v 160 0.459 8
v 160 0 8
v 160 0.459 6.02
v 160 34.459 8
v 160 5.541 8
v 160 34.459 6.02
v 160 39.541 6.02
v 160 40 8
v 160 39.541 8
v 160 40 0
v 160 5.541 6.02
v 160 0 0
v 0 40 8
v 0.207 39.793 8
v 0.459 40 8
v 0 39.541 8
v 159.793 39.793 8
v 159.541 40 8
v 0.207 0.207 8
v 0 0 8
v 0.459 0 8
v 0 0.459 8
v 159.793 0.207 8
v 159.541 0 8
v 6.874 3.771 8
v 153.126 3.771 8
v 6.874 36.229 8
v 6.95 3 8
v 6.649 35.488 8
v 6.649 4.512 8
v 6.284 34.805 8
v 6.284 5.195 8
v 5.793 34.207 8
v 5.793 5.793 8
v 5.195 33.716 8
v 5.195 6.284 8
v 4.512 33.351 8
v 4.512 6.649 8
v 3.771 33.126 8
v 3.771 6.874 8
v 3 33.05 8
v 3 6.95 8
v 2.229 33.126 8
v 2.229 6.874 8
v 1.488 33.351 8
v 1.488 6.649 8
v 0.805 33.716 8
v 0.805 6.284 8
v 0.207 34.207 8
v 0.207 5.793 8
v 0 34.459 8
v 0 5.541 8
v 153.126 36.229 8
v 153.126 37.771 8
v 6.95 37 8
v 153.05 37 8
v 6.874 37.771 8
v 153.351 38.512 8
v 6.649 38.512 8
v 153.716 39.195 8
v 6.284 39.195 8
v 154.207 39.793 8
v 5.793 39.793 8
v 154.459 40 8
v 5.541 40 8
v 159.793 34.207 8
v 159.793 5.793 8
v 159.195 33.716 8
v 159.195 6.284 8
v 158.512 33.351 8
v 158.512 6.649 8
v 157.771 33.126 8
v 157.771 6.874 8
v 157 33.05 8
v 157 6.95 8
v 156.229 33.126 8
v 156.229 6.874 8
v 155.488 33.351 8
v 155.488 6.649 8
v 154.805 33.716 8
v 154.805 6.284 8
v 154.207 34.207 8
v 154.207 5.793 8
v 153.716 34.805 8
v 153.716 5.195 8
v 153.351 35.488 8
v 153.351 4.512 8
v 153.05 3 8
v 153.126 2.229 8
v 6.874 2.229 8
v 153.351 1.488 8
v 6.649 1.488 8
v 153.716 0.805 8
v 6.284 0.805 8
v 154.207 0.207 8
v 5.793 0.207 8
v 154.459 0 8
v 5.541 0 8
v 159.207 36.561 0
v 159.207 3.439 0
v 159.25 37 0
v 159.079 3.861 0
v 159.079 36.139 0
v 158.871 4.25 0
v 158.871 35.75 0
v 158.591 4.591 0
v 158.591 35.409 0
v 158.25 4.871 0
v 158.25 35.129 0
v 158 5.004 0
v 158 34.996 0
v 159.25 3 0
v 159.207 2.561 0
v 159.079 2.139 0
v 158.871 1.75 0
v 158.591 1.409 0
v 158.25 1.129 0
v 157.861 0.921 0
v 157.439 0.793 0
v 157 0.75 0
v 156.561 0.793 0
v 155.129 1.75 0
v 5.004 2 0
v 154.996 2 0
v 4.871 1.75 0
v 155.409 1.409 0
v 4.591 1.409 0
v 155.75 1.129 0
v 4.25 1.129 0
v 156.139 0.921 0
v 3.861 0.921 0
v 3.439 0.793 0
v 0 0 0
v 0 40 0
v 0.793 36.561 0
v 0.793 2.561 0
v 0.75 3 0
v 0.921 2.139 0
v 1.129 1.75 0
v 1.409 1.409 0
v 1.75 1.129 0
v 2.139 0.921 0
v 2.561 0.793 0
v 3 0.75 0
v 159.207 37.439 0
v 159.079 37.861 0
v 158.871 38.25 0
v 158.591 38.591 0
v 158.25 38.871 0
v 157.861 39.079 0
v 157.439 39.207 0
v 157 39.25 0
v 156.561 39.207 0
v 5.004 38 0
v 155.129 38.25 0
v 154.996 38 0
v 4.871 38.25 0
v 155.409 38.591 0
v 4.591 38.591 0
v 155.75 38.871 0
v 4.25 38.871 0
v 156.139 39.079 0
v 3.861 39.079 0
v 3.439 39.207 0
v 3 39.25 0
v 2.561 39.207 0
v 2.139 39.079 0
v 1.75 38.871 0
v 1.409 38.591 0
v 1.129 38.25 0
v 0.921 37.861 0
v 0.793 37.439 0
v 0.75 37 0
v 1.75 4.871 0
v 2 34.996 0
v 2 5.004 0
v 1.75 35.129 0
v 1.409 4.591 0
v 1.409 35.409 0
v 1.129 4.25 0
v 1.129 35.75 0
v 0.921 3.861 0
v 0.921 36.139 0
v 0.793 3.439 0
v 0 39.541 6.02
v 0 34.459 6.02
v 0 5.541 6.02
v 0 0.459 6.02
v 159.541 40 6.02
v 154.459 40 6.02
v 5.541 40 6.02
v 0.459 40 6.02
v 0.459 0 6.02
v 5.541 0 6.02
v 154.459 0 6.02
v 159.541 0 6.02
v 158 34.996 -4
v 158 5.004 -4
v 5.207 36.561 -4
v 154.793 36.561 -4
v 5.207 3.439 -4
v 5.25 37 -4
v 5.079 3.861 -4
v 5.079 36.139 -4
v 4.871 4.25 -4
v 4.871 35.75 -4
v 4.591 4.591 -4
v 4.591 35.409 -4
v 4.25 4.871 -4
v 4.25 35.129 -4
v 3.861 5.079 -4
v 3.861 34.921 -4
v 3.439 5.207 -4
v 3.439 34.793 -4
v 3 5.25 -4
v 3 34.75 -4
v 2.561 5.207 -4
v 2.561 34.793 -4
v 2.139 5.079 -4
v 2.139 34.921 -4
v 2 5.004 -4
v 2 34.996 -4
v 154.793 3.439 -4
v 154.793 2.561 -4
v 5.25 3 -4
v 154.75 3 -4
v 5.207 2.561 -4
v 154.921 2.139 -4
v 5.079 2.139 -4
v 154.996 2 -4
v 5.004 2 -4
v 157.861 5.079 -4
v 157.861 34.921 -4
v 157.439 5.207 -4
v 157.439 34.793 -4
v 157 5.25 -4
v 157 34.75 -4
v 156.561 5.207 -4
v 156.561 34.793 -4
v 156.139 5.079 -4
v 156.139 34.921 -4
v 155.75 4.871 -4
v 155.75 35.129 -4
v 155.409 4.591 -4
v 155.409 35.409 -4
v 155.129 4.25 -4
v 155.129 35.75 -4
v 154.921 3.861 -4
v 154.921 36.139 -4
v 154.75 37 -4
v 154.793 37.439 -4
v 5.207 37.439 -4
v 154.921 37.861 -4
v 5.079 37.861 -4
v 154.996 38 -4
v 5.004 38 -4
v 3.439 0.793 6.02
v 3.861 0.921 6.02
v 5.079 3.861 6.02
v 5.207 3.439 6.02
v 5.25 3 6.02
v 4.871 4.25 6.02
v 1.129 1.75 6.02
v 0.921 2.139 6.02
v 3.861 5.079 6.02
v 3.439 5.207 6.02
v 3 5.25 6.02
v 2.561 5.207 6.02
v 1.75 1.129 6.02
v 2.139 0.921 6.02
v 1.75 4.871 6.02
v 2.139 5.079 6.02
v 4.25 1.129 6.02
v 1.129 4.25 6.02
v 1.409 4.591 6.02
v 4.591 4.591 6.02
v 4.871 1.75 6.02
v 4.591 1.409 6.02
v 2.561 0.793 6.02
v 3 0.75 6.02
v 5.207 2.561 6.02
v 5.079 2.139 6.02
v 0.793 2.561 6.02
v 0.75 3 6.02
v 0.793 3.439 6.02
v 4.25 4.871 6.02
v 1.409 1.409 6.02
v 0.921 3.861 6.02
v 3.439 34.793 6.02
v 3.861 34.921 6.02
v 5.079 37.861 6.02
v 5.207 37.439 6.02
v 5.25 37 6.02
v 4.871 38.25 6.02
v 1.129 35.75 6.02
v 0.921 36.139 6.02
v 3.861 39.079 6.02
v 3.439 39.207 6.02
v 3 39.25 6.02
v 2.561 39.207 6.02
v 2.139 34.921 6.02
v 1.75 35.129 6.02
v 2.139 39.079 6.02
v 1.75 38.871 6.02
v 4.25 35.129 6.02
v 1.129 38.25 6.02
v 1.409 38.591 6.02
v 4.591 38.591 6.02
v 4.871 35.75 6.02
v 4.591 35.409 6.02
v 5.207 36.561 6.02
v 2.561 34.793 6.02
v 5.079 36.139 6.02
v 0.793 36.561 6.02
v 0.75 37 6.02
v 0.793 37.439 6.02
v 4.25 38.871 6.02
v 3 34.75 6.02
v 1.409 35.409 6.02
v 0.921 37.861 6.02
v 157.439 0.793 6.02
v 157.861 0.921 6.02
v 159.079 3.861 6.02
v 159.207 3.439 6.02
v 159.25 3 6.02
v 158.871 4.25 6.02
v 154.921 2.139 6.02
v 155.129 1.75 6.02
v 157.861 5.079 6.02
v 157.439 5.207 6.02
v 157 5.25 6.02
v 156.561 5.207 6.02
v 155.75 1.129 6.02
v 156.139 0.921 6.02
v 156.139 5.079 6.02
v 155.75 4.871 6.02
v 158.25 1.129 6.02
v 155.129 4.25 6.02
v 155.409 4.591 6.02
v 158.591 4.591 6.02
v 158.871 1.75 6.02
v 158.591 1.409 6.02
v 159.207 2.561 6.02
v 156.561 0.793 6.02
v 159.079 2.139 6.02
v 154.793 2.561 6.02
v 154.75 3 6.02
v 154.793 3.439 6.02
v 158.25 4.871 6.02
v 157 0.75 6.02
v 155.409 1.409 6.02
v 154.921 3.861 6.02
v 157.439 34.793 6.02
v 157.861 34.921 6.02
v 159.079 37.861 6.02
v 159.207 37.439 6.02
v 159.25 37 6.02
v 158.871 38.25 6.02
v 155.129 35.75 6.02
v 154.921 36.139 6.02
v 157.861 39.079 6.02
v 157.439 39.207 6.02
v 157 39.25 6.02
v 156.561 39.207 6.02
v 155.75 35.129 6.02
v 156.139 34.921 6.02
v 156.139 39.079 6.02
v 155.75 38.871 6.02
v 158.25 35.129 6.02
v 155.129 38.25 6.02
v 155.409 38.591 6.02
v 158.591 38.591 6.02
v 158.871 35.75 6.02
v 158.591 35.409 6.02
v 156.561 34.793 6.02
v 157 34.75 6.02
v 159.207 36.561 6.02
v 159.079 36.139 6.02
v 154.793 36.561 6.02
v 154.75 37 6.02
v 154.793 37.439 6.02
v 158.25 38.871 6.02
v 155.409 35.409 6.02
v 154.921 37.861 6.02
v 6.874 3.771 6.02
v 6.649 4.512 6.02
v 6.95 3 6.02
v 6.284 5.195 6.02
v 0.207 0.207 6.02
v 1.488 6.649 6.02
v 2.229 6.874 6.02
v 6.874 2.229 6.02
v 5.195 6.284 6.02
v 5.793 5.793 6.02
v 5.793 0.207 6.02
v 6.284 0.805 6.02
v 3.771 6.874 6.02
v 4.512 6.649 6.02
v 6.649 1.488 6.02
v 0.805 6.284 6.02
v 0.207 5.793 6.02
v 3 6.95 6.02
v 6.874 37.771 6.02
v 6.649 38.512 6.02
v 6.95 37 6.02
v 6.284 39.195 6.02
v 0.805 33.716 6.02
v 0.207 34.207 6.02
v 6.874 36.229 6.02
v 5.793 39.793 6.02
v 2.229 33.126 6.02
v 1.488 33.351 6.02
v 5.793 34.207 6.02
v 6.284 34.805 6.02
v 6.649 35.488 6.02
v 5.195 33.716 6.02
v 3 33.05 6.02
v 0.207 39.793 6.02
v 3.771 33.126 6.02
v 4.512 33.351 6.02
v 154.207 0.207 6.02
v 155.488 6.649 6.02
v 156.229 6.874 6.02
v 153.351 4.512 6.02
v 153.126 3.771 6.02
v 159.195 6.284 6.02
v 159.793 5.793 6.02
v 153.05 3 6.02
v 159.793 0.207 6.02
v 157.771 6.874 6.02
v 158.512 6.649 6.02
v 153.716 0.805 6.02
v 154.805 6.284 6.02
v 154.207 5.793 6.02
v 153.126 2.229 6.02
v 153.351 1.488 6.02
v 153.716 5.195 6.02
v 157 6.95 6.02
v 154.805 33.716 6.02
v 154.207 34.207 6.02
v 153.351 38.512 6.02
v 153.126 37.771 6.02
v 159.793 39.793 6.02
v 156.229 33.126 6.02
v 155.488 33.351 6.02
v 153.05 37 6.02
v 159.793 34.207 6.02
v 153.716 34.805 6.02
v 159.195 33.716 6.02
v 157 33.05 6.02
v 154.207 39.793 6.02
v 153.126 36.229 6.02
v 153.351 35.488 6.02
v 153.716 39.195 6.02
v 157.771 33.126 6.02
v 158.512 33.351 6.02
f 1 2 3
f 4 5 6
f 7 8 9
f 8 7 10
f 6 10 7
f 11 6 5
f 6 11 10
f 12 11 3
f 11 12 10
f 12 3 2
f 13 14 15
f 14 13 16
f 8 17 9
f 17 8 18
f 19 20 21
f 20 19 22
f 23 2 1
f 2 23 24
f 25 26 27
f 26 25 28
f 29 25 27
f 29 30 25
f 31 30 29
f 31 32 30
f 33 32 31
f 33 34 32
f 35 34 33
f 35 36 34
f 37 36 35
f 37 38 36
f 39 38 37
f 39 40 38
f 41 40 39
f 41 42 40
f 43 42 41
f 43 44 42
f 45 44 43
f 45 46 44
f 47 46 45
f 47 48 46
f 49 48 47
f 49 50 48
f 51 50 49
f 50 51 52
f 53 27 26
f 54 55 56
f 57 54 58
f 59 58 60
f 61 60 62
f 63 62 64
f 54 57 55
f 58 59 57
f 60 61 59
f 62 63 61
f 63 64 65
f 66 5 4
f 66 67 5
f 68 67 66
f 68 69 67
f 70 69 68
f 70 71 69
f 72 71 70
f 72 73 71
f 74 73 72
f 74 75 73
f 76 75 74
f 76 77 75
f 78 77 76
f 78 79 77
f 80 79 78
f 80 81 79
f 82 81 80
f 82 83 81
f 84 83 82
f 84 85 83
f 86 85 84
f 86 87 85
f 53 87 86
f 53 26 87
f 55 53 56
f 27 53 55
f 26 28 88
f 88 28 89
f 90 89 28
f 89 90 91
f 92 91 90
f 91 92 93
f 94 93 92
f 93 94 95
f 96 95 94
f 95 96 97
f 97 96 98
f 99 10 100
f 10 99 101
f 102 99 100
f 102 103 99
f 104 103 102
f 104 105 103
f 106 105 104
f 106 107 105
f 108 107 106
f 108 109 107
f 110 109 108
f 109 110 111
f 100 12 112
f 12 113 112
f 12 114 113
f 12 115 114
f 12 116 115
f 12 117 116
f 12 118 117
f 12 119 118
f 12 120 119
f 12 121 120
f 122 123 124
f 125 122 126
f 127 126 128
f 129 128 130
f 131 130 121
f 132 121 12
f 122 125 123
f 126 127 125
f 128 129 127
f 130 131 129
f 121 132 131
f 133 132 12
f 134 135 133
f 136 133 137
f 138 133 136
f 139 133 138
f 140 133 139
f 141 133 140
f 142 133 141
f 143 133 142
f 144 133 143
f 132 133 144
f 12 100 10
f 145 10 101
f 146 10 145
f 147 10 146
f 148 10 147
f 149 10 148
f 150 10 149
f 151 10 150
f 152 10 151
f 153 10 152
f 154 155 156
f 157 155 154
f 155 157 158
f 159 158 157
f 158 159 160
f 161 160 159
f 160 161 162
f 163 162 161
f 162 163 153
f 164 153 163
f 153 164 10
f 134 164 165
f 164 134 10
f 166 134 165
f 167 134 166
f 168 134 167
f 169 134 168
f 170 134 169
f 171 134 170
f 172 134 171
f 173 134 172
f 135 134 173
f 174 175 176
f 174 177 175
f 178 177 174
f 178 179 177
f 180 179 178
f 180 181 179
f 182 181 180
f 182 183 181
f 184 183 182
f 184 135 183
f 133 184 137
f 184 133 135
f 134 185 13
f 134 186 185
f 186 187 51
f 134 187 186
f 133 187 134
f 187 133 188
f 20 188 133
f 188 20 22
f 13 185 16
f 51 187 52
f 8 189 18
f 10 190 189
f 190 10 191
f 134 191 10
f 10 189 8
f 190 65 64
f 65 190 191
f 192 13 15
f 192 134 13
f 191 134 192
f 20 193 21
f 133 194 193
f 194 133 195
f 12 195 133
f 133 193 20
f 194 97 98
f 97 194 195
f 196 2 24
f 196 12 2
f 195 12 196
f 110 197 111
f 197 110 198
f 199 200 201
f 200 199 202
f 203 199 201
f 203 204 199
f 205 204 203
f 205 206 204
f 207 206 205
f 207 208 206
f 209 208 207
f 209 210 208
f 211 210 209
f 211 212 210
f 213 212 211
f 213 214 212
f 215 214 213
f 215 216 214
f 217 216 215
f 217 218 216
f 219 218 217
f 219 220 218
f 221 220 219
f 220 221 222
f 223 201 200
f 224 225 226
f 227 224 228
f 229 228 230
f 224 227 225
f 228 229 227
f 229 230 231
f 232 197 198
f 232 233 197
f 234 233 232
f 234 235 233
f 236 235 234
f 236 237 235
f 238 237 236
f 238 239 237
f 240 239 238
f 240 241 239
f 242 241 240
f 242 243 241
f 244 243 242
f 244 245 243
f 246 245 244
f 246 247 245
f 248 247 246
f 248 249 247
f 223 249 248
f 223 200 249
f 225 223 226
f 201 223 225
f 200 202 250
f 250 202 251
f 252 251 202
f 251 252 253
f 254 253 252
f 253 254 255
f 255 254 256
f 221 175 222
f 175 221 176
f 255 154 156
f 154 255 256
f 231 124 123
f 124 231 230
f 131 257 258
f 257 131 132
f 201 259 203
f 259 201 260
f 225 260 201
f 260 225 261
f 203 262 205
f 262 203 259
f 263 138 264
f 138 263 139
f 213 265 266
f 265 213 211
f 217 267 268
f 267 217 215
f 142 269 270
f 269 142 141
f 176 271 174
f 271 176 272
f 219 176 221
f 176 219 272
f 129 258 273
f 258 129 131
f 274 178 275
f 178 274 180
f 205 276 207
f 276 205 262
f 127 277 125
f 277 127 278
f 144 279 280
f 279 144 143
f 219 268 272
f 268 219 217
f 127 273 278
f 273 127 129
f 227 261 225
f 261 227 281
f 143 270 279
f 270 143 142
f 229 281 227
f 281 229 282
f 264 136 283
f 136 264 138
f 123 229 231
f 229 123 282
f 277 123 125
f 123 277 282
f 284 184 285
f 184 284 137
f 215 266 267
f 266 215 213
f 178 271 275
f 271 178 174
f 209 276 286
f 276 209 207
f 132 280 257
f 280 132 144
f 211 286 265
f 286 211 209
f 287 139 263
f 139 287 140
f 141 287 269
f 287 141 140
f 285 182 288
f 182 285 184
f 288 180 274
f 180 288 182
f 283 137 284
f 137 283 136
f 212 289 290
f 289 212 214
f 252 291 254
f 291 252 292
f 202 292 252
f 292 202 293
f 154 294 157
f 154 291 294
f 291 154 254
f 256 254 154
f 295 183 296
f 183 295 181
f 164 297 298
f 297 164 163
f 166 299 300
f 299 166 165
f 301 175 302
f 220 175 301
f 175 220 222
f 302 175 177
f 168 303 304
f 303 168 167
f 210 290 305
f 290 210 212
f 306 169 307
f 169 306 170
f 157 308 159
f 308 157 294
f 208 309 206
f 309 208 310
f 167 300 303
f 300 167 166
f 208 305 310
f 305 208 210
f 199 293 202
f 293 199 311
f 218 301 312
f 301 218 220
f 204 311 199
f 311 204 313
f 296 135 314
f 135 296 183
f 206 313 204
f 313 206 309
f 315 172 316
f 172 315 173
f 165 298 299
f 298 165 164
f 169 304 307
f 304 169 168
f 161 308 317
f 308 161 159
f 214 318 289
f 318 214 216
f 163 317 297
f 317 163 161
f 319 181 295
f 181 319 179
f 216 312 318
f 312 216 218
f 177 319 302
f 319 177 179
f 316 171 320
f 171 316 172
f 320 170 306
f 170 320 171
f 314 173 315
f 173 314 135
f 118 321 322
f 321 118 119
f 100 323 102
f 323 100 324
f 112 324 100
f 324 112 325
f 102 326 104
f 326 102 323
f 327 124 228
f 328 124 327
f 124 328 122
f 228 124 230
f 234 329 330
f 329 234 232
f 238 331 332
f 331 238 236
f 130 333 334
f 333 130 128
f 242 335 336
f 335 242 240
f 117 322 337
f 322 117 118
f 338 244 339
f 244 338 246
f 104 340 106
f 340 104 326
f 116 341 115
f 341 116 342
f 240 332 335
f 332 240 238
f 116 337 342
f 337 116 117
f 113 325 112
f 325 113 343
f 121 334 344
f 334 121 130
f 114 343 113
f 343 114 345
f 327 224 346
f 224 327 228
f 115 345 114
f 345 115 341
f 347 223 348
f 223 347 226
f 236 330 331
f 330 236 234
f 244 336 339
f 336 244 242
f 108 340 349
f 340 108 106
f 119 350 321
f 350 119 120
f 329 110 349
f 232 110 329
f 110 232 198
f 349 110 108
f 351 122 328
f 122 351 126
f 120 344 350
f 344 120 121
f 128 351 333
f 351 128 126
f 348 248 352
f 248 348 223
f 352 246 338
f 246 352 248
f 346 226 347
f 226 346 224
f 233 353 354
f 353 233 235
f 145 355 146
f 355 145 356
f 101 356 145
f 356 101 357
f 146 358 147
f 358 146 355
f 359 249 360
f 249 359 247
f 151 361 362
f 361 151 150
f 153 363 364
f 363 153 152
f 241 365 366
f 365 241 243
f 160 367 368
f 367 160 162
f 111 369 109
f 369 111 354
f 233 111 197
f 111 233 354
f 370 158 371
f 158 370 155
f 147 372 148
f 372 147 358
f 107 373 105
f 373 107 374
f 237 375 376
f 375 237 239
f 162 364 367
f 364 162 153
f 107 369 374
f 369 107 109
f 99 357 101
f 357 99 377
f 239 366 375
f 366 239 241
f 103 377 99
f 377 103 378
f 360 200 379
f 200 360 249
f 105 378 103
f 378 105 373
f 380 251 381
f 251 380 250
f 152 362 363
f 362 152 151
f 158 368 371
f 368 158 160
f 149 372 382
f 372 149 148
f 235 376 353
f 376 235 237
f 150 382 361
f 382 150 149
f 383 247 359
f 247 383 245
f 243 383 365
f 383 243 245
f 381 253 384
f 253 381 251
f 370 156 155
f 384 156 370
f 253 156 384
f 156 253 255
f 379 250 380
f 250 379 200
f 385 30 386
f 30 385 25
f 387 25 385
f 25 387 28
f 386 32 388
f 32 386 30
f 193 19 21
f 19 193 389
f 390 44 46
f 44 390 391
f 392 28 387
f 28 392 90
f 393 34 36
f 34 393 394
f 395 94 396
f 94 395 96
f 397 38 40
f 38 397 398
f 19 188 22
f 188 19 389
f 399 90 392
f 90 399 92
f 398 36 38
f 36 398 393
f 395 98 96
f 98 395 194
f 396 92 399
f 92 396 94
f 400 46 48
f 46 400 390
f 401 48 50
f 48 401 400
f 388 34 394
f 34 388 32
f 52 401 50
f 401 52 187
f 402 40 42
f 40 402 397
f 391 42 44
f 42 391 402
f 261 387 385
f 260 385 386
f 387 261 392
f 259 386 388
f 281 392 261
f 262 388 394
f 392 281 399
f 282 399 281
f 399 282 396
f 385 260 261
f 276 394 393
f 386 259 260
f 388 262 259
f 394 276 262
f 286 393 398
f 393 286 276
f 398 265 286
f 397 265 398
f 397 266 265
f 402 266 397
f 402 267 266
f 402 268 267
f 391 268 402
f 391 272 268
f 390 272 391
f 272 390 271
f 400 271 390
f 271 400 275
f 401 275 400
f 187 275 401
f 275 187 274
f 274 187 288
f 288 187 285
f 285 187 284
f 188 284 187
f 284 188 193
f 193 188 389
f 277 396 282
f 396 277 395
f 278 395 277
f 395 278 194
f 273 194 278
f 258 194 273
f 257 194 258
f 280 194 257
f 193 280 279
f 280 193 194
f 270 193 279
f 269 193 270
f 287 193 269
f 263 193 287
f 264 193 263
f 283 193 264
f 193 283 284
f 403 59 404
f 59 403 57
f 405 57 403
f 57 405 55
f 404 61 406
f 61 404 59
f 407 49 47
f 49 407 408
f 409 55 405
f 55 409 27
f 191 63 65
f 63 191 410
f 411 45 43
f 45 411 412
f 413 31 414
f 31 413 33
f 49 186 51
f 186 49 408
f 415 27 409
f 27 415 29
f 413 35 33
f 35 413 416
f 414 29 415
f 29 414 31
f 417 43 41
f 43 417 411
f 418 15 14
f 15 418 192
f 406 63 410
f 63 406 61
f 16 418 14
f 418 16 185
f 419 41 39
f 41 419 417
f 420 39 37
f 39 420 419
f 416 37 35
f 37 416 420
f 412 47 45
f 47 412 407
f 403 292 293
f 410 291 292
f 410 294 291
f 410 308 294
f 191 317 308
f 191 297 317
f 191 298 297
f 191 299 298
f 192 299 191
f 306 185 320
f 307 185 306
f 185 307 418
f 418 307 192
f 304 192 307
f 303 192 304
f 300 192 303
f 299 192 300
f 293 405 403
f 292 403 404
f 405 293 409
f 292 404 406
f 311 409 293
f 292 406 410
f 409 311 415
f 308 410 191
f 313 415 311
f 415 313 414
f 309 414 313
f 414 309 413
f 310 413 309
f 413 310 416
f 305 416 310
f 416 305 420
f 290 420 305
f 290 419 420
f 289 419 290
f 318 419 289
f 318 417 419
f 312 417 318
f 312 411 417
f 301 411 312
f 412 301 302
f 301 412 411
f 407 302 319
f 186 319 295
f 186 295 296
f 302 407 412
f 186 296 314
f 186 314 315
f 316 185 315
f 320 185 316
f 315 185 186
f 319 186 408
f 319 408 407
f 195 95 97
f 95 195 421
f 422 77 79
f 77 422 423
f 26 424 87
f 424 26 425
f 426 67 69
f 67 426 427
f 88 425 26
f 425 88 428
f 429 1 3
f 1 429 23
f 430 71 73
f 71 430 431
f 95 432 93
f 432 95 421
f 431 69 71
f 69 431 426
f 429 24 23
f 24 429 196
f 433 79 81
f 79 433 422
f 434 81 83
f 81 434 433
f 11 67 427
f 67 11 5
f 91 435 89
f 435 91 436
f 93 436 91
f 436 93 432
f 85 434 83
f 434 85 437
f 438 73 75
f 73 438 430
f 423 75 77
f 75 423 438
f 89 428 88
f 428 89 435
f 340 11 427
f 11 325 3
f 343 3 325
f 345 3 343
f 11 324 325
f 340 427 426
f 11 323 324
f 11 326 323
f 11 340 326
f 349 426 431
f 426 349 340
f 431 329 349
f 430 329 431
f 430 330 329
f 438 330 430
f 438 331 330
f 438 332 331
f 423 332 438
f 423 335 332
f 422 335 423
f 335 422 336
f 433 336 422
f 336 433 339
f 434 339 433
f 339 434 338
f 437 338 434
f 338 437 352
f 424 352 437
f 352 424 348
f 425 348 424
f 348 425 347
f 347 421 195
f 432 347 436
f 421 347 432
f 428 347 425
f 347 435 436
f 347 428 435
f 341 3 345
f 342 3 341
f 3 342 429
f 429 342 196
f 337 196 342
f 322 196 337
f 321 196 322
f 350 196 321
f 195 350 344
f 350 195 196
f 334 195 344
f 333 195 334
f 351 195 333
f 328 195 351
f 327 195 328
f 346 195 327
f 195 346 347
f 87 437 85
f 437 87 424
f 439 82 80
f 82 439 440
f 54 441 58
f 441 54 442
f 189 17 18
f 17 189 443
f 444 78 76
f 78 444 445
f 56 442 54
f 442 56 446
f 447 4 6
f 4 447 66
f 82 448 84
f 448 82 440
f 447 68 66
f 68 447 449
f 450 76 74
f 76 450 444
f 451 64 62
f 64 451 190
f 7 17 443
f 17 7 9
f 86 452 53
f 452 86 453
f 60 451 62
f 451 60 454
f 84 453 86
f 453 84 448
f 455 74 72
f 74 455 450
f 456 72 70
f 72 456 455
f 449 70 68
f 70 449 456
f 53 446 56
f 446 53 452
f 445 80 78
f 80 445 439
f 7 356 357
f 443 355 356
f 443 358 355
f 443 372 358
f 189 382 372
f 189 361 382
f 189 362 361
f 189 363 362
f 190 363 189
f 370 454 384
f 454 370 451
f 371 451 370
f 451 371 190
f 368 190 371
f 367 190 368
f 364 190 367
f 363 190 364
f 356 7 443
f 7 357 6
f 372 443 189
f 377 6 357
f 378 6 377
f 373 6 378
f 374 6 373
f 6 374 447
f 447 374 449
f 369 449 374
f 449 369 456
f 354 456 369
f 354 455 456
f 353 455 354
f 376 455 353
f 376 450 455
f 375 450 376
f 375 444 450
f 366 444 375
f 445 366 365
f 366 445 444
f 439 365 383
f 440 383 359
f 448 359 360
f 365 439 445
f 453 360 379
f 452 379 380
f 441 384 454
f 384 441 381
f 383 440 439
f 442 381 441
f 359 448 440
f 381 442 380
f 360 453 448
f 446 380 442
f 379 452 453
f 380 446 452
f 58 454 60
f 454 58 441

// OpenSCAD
$fn = 32;

// ----------------------------------------------------------------------
// Enclosure lid: 160 x 40 x 8 mm, 4 bolt holes
// ----------------------------------------------------------------------

// --- parameters (mm) ---
length = 160;             // lid length, X
width = 40;               // lid width, Y
plate_t = 8;              // lid plate thickness
bolt_d = 4.5;             // bolt clearance
boss_lip = 3;             // bolt hole inset from the corner
sink = 1;                 // overlap of the lip and ribs into the plate
lip_h = 5;                // lip height below the plate
lip_wall = 2;             // lip wall thickness
cs_d = 7.9;               // countersink diameter
cs_h = 1.98;              // countersink depth

module plate() {
  cube([length, width, plate_t]);
  /* lip that drops into the housing opening, sunk into the plate */
  translate([lip_wall, lip_wall, -lip_h + sink]) cube([length - 2 * lip_wall, width - 2 * lip_wall, lip_h]);
}

difference() {
  plate();
  /* bolt pattern matching the corner bosses */
  for (sx = [0, 1]) for (sy = [0, 1])
    translate([sx * (length - 2 * boss_lip) + boss_lip, sy * (width - 2 * boss_lip) + boss_lip, -lip_h - 1])
      cylinder(h = plate_t + lip_h + 2, d = bolt_d);
  /* countersinks so the heads sit flush */
  for (sx = [0, 1]) for (sy = [0, 1])
    translate([sx * (length - 2 * boss_lip) + boss_lip, sy * (width - 2 * boss_lip) + boss_lip, plate_t - cs_h])
      cylinder(h = cs_h + 0.5, d = cs_d);
}
